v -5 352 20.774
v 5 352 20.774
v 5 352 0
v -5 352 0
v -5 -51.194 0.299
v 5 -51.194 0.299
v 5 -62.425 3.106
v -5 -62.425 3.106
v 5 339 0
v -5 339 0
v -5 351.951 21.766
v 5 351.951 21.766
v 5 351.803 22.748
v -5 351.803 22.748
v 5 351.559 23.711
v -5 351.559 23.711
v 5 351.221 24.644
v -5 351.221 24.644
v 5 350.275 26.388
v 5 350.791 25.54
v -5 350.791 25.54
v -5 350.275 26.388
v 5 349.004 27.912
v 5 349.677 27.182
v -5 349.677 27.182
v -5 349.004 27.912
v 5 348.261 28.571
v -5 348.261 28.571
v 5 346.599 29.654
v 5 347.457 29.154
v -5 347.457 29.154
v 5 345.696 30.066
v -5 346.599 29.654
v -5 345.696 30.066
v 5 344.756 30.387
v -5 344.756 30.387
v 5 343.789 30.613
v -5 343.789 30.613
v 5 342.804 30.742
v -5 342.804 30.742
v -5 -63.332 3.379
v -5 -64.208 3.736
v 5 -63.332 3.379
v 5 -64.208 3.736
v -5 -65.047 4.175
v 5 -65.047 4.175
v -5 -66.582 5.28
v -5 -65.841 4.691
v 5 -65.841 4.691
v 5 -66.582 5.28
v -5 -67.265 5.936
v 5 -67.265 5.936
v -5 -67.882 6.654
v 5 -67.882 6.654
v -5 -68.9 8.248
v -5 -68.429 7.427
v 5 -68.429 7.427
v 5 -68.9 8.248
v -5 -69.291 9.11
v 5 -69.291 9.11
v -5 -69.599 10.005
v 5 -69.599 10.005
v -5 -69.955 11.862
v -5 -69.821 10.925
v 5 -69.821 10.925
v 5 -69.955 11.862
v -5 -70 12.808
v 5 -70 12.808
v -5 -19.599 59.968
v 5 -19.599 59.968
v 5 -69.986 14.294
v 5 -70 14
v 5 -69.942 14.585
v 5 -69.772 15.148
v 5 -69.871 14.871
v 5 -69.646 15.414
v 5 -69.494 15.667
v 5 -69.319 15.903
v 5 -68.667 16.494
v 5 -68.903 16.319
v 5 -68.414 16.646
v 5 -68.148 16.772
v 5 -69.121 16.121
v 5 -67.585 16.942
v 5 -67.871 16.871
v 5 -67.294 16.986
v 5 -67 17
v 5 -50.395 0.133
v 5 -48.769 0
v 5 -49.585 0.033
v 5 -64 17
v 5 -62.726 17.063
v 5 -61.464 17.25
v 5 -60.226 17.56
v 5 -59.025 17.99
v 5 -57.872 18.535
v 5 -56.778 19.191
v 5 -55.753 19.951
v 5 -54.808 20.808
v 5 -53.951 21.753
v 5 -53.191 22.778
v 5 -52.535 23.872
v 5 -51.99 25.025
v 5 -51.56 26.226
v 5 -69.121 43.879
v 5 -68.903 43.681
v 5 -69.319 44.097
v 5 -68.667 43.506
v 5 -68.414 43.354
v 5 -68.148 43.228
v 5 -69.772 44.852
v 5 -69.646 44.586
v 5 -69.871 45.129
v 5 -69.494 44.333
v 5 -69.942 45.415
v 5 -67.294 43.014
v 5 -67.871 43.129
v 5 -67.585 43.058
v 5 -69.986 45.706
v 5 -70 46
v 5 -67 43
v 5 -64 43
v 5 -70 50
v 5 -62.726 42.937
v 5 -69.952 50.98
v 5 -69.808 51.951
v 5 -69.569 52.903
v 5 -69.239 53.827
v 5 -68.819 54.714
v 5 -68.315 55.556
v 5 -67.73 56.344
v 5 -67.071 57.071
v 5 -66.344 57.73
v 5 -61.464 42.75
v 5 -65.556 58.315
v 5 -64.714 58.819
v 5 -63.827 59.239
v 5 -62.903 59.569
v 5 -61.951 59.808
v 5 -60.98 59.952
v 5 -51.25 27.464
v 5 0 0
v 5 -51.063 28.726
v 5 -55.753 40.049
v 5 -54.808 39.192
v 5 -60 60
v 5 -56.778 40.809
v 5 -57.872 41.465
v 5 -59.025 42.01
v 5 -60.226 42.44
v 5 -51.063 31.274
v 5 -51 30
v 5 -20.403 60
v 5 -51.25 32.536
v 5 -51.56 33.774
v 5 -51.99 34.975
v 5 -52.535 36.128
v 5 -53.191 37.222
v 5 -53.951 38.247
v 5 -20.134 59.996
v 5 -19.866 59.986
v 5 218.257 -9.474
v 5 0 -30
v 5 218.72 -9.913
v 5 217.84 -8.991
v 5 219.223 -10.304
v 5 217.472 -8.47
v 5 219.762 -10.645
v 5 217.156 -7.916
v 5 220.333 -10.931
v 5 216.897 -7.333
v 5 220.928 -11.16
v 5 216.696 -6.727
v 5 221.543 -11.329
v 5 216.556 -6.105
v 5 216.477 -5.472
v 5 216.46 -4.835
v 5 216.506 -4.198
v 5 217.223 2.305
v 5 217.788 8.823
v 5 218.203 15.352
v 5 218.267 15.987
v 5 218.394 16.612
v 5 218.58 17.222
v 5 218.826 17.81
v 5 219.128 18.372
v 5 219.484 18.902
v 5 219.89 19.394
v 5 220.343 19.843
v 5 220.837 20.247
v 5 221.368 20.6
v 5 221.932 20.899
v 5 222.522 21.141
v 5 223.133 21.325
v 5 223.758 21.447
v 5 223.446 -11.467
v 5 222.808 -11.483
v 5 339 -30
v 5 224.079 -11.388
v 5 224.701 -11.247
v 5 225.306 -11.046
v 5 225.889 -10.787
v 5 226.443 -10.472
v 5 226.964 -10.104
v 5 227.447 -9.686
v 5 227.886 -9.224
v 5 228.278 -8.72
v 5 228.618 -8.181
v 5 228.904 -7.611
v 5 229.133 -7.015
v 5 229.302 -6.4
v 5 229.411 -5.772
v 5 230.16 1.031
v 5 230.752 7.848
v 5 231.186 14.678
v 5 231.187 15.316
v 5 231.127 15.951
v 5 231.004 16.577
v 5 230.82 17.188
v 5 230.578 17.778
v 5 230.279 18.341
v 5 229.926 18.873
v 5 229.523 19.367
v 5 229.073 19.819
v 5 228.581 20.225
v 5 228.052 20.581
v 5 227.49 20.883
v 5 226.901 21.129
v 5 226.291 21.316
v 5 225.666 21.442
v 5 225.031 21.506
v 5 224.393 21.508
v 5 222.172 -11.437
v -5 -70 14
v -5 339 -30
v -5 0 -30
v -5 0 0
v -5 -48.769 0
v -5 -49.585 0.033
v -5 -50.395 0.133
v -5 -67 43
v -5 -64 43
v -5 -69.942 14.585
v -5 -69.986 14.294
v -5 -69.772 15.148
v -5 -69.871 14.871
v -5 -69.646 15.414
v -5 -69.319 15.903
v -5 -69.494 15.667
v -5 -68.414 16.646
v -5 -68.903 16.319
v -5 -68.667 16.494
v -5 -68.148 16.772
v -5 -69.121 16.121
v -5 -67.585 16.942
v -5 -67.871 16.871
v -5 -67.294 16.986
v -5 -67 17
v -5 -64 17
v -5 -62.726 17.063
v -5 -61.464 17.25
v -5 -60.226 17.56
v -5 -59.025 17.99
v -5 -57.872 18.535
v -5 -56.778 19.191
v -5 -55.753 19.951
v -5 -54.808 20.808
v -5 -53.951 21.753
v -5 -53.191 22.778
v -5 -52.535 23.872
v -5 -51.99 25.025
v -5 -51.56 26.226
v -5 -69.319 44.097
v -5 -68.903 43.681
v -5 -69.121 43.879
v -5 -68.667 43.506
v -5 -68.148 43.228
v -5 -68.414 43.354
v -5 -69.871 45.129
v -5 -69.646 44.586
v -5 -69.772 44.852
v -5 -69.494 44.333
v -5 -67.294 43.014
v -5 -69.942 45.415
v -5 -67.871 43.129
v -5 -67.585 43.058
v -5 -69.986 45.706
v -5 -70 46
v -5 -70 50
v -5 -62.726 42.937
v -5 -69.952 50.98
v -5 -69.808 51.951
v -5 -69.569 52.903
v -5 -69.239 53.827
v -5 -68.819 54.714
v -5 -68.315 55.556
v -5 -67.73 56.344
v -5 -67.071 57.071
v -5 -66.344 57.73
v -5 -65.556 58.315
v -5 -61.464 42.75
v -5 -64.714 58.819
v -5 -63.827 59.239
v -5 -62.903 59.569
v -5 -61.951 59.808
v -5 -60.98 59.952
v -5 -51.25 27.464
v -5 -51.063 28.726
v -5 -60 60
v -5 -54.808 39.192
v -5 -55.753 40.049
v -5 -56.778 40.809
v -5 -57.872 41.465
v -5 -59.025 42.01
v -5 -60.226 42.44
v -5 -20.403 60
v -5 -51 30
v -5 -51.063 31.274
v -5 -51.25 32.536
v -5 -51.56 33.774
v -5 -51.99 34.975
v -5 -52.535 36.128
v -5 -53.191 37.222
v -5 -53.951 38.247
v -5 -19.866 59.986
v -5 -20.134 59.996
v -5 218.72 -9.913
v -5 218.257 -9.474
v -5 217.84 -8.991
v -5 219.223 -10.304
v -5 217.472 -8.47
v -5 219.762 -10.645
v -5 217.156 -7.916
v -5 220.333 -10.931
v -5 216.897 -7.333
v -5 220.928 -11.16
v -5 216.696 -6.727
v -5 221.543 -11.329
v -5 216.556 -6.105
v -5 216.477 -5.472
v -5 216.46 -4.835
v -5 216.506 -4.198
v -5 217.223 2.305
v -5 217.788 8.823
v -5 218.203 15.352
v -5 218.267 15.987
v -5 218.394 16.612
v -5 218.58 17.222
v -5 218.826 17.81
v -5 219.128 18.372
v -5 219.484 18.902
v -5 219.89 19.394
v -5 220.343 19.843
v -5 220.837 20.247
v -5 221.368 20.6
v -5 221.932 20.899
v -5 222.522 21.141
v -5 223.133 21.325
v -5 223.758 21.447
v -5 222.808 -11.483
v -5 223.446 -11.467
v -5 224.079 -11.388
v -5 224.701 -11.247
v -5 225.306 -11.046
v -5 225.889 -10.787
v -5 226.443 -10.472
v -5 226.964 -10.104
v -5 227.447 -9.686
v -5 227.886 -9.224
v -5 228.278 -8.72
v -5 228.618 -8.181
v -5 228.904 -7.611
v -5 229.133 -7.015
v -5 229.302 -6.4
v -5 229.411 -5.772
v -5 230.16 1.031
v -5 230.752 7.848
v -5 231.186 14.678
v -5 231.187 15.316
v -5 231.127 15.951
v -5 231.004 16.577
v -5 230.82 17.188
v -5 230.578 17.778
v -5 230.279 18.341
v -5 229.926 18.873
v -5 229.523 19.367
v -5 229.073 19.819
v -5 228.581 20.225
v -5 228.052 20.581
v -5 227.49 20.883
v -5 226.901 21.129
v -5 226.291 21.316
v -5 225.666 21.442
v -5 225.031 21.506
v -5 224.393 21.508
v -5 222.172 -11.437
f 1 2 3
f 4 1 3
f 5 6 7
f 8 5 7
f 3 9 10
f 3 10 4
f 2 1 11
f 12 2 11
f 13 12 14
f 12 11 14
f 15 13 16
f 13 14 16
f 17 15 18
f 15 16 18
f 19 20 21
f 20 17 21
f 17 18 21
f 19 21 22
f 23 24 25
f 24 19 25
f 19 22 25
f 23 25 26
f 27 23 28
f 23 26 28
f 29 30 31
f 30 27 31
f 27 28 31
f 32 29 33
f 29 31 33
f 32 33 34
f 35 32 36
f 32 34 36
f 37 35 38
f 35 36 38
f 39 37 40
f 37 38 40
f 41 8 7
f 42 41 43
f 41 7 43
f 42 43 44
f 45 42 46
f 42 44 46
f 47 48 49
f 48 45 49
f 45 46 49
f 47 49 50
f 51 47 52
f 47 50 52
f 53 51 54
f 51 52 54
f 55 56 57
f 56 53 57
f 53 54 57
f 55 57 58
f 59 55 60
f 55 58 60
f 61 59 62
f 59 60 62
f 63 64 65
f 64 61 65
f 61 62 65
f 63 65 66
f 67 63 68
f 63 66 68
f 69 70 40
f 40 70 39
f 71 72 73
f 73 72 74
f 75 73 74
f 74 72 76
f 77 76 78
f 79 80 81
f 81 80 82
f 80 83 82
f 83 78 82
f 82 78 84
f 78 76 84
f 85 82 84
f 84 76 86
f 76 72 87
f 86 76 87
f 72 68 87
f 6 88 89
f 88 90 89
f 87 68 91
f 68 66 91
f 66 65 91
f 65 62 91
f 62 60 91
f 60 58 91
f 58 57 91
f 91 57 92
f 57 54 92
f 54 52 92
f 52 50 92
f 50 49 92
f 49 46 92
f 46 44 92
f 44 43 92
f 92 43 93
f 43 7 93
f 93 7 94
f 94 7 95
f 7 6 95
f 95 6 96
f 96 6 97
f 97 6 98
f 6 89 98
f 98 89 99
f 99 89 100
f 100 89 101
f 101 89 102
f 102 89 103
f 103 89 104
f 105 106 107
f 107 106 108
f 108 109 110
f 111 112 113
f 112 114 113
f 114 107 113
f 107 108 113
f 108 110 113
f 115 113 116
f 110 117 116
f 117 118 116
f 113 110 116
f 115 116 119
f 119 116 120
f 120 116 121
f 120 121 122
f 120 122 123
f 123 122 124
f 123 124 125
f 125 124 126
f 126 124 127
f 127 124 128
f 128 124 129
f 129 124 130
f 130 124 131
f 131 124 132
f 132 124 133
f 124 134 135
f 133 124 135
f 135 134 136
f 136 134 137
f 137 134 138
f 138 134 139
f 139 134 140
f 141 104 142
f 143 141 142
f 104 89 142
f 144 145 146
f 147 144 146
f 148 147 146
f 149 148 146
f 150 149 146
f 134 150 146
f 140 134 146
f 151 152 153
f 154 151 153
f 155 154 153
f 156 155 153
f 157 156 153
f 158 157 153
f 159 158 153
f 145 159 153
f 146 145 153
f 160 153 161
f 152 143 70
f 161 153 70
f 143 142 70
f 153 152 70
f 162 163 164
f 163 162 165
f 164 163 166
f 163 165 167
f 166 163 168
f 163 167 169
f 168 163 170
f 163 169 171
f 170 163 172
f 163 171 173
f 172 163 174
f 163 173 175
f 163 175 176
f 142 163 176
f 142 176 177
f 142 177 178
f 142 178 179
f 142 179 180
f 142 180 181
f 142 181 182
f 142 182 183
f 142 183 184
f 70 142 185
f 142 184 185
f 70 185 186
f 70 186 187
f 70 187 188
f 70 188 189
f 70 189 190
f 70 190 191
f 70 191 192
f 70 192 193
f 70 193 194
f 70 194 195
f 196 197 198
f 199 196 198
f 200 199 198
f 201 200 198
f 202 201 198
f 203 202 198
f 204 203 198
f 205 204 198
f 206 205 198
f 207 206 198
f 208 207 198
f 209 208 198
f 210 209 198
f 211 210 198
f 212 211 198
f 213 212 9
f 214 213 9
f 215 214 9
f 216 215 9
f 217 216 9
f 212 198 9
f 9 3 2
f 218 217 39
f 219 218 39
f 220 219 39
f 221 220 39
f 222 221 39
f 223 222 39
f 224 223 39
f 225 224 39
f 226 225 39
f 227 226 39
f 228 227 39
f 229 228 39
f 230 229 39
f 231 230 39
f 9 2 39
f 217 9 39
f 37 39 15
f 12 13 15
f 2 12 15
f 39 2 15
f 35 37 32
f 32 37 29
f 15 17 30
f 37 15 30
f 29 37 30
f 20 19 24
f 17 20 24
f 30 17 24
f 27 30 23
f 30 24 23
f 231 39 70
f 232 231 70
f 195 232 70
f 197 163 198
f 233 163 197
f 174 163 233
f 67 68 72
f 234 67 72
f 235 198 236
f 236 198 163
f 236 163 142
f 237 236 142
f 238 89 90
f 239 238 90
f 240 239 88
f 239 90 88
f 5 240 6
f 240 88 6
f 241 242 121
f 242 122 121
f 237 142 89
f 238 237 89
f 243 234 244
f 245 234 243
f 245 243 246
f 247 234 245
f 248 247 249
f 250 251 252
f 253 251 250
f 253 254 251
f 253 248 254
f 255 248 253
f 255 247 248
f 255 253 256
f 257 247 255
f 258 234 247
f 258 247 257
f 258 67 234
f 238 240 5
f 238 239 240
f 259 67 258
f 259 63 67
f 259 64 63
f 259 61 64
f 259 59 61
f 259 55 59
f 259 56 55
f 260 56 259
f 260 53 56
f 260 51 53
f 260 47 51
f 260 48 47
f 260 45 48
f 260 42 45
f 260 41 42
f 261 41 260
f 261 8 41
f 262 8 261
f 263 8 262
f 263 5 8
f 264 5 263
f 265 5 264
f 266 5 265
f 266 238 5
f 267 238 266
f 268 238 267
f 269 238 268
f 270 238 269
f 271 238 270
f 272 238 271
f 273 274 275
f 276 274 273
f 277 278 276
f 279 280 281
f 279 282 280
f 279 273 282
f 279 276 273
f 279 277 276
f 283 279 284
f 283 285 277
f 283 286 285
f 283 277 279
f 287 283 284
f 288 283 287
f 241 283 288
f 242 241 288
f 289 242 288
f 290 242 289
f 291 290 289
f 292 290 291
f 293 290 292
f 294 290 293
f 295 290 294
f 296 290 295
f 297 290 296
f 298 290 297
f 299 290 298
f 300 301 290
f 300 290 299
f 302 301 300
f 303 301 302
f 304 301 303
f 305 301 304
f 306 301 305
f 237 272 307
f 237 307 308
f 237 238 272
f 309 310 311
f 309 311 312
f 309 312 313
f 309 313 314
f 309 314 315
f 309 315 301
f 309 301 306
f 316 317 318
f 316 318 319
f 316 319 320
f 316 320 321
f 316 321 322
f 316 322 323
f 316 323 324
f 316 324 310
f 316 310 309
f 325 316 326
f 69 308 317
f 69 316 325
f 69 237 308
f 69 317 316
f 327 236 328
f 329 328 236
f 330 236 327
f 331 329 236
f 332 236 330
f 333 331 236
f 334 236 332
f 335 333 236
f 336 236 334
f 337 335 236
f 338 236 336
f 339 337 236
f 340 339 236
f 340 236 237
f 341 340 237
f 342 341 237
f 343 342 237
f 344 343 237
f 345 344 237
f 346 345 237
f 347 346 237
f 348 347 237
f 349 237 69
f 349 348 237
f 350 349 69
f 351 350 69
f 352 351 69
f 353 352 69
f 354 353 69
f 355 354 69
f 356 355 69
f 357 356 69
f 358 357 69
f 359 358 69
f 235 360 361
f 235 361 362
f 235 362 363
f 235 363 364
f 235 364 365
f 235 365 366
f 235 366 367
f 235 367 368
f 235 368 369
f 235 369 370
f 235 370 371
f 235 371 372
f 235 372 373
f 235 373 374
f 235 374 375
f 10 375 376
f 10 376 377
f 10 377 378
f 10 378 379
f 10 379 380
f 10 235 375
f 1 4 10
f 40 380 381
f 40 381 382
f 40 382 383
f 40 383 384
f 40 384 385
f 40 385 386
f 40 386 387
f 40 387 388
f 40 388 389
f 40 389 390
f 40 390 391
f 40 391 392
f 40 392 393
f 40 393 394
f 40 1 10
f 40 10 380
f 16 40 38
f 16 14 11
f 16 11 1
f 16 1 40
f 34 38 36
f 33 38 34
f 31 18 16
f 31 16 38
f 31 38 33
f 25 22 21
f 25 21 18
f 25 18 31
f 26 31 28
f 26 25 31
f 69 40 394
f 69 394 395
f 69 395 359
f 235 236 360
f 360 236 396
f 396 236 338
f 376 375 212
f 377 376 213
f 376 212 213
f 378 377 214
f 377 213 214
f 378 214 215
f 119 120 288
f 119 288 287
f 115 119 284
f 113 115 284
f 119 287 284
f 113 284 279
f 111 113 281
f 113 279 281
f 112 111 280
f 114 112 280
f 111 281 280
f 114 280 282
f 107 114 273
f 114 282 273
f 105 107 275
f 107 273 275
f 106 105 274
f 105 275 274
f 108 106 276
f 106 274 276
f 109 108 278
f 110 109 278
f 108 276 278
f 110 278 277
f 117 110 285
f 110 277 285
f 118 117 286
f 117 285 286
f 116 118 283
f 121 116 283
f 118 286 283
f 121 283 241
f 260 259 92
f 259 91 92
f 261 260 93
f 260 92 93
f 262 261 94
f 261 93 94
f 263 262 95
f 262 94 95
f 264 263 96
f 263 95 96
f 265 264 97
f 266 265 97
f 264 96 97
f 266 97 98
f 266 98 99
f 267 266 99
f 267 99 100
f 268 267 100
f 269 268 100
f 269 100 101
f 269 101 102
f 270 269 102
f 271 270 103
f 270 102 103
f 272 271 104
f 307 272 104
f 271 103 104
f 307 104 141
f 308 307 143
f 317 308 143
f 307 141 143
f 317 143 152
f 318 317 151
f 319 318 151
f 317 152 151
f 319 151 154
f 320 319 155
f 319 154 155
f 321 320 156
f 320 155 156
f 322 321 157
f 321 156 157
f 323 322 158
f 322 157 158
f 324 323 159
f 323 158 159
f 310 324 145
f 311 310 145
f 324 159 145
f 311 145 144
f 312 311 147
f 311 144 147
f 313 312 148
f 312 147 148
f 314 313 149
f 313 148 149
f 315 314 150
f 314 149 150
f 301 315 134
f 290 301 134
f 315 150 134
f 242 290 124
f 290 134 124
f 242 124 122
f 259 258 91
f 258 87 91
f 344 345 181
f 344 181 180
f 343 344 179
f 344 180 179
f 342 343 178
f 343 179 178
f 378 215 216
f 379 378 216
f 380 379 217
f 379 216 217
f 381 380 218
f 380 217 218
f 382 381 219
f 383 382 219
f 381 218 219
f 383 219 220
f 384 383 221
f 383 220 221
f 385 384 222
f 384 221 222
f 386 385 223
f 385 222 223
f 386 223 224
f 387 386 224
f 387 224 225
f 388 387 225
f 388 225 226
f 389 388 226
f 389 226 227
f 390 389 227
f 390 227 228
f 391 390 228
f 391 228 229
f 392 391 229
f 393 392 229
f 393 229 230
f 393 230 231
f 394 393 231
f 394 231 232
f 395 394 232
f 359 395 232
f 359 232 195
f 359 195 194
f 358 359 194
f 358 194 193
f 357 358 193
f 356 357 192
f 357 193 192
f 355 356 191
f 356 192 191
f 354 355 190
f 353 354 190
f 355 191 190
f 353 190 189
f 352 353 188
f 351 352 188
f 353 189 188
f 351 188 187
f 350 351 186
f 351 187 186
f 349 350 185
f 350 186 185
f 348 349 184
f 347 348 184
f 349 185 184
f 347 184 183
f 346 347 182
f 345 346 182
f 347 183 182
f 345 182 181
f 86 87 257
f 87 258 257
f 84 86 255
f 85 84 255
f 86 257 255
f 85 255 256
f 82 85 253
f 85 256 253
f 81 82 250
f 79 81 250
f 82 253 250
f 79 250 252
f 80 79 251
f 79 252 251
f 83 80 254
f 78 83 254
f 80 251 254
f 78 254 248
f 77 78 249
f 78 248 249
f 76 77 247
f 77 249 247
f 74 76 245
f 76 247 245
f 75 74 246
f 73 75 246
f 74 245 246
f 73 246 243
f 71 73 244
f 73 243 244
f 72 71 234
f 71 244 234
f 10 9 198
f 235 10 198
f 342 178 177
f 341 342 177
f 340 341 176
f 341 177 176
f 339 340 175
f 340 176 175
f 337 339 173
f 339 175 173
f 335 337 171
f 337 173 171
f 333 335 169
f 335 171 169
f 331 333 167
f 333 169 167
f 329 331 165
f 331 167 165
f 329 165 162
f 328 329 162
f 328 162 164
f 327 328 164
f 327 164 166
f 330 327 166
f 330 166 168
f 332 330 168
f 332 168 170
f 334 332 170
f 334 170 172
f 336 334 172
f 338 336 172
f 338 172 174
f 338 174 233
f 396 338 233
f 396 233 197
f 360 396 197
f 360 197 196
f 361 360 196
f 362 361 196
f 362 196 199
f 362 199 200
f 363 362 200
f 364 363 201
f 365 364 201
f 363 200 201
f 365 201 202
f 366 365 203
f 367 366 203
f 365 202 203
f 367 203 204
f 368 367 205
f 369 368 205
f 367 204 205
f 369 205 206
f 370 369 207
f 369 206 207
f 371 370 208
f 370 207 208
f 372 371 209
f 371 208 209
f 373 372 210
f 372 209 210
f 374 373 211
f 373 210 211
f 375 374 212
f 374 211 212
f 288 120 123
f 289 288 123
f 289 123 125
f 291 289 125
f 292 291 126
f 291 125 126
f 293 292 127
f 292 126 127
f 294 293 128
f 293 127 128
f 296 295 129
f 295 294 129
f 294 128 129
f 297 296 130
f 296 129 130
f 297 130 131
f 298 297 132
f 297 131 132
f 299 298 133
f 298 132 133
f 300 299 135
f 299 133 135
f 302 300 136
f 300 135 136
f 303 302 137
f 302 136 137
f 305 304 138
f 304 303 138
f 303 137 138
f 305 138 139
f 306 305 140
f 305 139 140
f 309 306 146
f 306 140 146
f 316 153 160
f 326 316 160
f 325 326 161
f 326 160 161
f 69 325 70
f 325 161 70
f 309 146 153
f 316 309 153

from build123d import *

# Parameters (mm, degrees)
BOSS_EXTRUDE1_DEPTH = 5
FILLET1_R           = 10
FILLET2_R           = 3
SKETCH2_W           = 30
SKETCH2_H           = 13
CUT_EXTRUDE1_DEPTH  = 358.217020871
SKETCH3_R           = 6.5
CUT_EXTRUDE2_DEPTH  = 358.217020871
CUT_EXTRUDE3_DEPTH  = 358.217020871


with BuildPart() as part:
    # Sketch1 → Boss-Extrude1 (new, symmetric)
    with BuildSketch(Plane(origin=(0, 0, 0), x_dir=(0, 0, -1), z_dir=(1, 0, 0))):
        with BuildLine():
            Line((30, 0), (0, 0))
            Line((0, 0), (0, -50))
            Line((0, -50), (-5, -70))
            Line((-5, -70), (-17, -70))
            Line((-17, -70), (-17, -64))
            ThreePointArc((-17, -64), (-30, -51), (-43, -64))
            Line((-43, -64), (-43, -70))
            Line((-43, -70), (-60, -70))
            Line((-60, -70), (-60, -20))
            Line((-60, -20), (-30, 352))
            Line((-30, 352), (30, 352))
            Line((30, 352), (30, 0))
        make_face()
    extrude(amount=BOSS_EXTRUDE1_DEPTH, both=True)

    # Fillet1
    # the kernel refuses this fillet: 10 mm, written as the material it takes off along each edge
    with BuildSketch(Plane(origin=(8.07764064, -50, 0), x_dir=(0, -0.9701425001453321, 0.24253562503633222), z_dir=(-1, 0, 0))) as fillet1_piece_1:
        with BuildLine():
            CenterArc((FILLET1_R * 0.123105625618, FILLET1_R), FILLET1_R, 255.963756532, 14.036243468)
            Line((-FILLET1_R * 0.119429999419, FILLET1_R * 0.0298574998547), (0, 0))
            Line((0, 0), (FILLET1_R * 0.123105625618, 0))
        make_face()
    extrude(amount=16.155281281, mode=Mode.SUBTRACT)
    with BuildSketch(Plane(origin=(24.51941016, -70, 5), x_dir=(0, 0, 1), z_dir=(-1, 0, 0))) as fillet1_piece_2:
        with BuildLine():
            CenterArc((FILLET1_R * 0.780776406404, FILLET1_R), FILLET1_R, 194.036243468, 75.963756532)
            Line((-FILLET1_R * 0.189366093741, FILLET1_R * 0.757464374964), (0, 0))
            Line((0, 0), (FILLET1_R * 0.780776406404, 0))
        make_face()
    extrude(amount=49.03882032, mode=Mode.SUBTRACT)
    with BuildSketch(Plane(origin=(30, -70, 60), x_dir=(0, 1, 0), z_dir=(-1, 0, 0))) as fillet1_piece_3:
        with BuildLine():
            CenterArc((FILLET1_R, FILLET1_R), FILLET1_R, 180, 90)
            Line((0, FILLET1_R), (0, 0))
            Line((0, 0), (FILLET1_R, 0))
        make_face()
    extrude(amount=60, mode=Mode.SUBTRACT)
    with BuildSketch(Plane(origin=(6.006430802, -20, 60), x_dir=(0, 0.9967639550118461, -0.08038418992029778), z_dir=(-1, 0, 0))) as fillet1_piece_4:
        with BuildLine():
            CenterArc((FILLET1_R * 0.0402572320672, FILLET1_R), FILLET1_R, 265.389350681, 4.610649319)
            Line((-FILLET1_R * 0.0401269578531, FILLET1_R * 0.00323604498815), (0, 0))
            Line((0, 0), (FILLET1_R * 0.0402572320672, 0))
        make_face()
    extrude(amount=12.012861603, mode=Mode.SUBTRACT)
    with BuildSketch(Plane(origin=(-28.065034742, 352, 30), x_dir=(0, 0, -1), z_dir=(1, 0, 0))) as fillet1_piece_5:
        with BuildLine():
            CenterArc((FILLET1_R * 0.922601389683, -FILLET1_R), FILLET1_R, 90, 85.389350681)
            Line((-FILLET1_R * 0.074162565329, -FILLET1_R * 0.91961581008), (0, 0))
            Line((0, 0), (FILLET1_R * 0.922601389683, 0))
        make_face()
    extrude(amount=56.130069484, mode=Mode.SUBTRACT)

    # Fillet2
    fillet2_edges = [part.edges().sort_by_distance(p)[0] for p in [
        (0, -70, 17),
        (0, -70, 43),
    ]]
    fillet(fillet2_edges, radius=FILLET2_R)

    # Sketch2 → Cut-Extrude1 (cut, through all)
    with BuildSketch(Plane(origin=(5, 0, 0), x_dir=(0, 0, -1), z_dir=(1, 0, 0))):
        with Locations((15, 345.5)):
            Rectangle(SKETCH2_W, SKETCH2_H)
    extrude(amount=-CUT_EXTRUDE1_DEPTH, mode=Mode.SUBTRACT)

    # Sketch3 → Cut-Extrude2 (cut, through all)
    with BuildSketch(Plane(origin=(5, 0, 0), x_dir=(0, 0, -1), z_dir=(1, 0, 0))):
        with Locations((-5, 224)):
            Circle(SKETCH3_R)
    extrude(amount=-CUT_EXTRUDE2_DEPTH, mode=Mode.SUBTRACT)

    # Sketch4 → Cut-Extrude3 (cut, through all)
    with BuildSketch(Plane(origin=(5, 0, 0), x_dir=(0, 0, -1), z_dir=(1, 0, 0))):
        with BuildLine():
            ThreePointArc((5.771557213, 229.410506159), (-4.437877767, 230.475648122), (-14.678140573, 231.185653536))
            ThreePointArc((-14.678140573, 231.185653536), (-21.506336405, 225.031326466), (-15.352009335, 218.203130634))
            ThreePointArc((-15.352009335, 218.203130634), (-5.562122233, 217.524351878), (4.198292879, 216.506055789))
            ThreePointArc((4.198292879, 216.506055789), (11.437150231, 222.171648807), (5.771557213, 229.410506159))
        make_face()
    extrude(amount=-CUT_EXTRUDE3_DEPTH, mode=Mode.SUBTRACT)


solid = part.part
